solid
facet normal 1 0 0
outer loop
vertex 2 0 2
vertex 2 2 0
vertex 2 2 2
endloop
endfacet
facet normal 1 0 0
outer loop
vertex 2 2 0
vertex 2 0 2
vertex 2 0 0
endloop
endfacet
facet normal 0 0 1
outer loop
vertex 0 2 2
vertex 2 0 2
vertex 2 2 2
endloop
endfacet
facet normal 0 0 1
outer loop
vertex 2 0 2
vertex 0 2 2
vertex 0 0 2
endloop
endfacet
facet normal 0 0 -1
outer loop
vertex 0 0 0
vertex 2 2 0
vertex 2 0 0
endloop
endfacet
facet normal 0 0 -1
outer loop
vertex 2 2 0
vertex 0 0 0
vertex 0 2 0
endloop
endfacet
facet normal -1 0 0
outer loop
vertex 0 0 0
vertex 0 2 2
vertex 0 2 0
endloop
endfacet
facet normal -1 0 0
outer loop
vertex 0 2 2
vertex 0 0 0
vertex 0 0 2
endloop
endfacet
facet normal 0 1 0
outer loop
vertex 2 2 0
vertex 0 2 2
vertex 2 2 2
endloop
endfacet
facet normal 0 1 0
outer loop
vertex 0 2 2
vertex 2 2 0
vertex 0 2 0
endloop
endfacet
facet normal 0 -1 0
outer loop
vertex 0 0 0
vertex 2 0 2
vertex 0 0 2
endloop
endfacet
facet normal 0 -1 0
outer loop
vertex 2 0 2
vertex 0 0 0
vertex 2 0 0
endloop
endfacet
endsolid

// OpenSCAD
// expect: lang="OpenSCAD" total=10 code=5 comment=2 blank=3 shebang=0
// simple openscad fixture

module cube_box(size) {
	cube(size);
}

cube_box(2);

translate([1,1,1]) cube(1);
